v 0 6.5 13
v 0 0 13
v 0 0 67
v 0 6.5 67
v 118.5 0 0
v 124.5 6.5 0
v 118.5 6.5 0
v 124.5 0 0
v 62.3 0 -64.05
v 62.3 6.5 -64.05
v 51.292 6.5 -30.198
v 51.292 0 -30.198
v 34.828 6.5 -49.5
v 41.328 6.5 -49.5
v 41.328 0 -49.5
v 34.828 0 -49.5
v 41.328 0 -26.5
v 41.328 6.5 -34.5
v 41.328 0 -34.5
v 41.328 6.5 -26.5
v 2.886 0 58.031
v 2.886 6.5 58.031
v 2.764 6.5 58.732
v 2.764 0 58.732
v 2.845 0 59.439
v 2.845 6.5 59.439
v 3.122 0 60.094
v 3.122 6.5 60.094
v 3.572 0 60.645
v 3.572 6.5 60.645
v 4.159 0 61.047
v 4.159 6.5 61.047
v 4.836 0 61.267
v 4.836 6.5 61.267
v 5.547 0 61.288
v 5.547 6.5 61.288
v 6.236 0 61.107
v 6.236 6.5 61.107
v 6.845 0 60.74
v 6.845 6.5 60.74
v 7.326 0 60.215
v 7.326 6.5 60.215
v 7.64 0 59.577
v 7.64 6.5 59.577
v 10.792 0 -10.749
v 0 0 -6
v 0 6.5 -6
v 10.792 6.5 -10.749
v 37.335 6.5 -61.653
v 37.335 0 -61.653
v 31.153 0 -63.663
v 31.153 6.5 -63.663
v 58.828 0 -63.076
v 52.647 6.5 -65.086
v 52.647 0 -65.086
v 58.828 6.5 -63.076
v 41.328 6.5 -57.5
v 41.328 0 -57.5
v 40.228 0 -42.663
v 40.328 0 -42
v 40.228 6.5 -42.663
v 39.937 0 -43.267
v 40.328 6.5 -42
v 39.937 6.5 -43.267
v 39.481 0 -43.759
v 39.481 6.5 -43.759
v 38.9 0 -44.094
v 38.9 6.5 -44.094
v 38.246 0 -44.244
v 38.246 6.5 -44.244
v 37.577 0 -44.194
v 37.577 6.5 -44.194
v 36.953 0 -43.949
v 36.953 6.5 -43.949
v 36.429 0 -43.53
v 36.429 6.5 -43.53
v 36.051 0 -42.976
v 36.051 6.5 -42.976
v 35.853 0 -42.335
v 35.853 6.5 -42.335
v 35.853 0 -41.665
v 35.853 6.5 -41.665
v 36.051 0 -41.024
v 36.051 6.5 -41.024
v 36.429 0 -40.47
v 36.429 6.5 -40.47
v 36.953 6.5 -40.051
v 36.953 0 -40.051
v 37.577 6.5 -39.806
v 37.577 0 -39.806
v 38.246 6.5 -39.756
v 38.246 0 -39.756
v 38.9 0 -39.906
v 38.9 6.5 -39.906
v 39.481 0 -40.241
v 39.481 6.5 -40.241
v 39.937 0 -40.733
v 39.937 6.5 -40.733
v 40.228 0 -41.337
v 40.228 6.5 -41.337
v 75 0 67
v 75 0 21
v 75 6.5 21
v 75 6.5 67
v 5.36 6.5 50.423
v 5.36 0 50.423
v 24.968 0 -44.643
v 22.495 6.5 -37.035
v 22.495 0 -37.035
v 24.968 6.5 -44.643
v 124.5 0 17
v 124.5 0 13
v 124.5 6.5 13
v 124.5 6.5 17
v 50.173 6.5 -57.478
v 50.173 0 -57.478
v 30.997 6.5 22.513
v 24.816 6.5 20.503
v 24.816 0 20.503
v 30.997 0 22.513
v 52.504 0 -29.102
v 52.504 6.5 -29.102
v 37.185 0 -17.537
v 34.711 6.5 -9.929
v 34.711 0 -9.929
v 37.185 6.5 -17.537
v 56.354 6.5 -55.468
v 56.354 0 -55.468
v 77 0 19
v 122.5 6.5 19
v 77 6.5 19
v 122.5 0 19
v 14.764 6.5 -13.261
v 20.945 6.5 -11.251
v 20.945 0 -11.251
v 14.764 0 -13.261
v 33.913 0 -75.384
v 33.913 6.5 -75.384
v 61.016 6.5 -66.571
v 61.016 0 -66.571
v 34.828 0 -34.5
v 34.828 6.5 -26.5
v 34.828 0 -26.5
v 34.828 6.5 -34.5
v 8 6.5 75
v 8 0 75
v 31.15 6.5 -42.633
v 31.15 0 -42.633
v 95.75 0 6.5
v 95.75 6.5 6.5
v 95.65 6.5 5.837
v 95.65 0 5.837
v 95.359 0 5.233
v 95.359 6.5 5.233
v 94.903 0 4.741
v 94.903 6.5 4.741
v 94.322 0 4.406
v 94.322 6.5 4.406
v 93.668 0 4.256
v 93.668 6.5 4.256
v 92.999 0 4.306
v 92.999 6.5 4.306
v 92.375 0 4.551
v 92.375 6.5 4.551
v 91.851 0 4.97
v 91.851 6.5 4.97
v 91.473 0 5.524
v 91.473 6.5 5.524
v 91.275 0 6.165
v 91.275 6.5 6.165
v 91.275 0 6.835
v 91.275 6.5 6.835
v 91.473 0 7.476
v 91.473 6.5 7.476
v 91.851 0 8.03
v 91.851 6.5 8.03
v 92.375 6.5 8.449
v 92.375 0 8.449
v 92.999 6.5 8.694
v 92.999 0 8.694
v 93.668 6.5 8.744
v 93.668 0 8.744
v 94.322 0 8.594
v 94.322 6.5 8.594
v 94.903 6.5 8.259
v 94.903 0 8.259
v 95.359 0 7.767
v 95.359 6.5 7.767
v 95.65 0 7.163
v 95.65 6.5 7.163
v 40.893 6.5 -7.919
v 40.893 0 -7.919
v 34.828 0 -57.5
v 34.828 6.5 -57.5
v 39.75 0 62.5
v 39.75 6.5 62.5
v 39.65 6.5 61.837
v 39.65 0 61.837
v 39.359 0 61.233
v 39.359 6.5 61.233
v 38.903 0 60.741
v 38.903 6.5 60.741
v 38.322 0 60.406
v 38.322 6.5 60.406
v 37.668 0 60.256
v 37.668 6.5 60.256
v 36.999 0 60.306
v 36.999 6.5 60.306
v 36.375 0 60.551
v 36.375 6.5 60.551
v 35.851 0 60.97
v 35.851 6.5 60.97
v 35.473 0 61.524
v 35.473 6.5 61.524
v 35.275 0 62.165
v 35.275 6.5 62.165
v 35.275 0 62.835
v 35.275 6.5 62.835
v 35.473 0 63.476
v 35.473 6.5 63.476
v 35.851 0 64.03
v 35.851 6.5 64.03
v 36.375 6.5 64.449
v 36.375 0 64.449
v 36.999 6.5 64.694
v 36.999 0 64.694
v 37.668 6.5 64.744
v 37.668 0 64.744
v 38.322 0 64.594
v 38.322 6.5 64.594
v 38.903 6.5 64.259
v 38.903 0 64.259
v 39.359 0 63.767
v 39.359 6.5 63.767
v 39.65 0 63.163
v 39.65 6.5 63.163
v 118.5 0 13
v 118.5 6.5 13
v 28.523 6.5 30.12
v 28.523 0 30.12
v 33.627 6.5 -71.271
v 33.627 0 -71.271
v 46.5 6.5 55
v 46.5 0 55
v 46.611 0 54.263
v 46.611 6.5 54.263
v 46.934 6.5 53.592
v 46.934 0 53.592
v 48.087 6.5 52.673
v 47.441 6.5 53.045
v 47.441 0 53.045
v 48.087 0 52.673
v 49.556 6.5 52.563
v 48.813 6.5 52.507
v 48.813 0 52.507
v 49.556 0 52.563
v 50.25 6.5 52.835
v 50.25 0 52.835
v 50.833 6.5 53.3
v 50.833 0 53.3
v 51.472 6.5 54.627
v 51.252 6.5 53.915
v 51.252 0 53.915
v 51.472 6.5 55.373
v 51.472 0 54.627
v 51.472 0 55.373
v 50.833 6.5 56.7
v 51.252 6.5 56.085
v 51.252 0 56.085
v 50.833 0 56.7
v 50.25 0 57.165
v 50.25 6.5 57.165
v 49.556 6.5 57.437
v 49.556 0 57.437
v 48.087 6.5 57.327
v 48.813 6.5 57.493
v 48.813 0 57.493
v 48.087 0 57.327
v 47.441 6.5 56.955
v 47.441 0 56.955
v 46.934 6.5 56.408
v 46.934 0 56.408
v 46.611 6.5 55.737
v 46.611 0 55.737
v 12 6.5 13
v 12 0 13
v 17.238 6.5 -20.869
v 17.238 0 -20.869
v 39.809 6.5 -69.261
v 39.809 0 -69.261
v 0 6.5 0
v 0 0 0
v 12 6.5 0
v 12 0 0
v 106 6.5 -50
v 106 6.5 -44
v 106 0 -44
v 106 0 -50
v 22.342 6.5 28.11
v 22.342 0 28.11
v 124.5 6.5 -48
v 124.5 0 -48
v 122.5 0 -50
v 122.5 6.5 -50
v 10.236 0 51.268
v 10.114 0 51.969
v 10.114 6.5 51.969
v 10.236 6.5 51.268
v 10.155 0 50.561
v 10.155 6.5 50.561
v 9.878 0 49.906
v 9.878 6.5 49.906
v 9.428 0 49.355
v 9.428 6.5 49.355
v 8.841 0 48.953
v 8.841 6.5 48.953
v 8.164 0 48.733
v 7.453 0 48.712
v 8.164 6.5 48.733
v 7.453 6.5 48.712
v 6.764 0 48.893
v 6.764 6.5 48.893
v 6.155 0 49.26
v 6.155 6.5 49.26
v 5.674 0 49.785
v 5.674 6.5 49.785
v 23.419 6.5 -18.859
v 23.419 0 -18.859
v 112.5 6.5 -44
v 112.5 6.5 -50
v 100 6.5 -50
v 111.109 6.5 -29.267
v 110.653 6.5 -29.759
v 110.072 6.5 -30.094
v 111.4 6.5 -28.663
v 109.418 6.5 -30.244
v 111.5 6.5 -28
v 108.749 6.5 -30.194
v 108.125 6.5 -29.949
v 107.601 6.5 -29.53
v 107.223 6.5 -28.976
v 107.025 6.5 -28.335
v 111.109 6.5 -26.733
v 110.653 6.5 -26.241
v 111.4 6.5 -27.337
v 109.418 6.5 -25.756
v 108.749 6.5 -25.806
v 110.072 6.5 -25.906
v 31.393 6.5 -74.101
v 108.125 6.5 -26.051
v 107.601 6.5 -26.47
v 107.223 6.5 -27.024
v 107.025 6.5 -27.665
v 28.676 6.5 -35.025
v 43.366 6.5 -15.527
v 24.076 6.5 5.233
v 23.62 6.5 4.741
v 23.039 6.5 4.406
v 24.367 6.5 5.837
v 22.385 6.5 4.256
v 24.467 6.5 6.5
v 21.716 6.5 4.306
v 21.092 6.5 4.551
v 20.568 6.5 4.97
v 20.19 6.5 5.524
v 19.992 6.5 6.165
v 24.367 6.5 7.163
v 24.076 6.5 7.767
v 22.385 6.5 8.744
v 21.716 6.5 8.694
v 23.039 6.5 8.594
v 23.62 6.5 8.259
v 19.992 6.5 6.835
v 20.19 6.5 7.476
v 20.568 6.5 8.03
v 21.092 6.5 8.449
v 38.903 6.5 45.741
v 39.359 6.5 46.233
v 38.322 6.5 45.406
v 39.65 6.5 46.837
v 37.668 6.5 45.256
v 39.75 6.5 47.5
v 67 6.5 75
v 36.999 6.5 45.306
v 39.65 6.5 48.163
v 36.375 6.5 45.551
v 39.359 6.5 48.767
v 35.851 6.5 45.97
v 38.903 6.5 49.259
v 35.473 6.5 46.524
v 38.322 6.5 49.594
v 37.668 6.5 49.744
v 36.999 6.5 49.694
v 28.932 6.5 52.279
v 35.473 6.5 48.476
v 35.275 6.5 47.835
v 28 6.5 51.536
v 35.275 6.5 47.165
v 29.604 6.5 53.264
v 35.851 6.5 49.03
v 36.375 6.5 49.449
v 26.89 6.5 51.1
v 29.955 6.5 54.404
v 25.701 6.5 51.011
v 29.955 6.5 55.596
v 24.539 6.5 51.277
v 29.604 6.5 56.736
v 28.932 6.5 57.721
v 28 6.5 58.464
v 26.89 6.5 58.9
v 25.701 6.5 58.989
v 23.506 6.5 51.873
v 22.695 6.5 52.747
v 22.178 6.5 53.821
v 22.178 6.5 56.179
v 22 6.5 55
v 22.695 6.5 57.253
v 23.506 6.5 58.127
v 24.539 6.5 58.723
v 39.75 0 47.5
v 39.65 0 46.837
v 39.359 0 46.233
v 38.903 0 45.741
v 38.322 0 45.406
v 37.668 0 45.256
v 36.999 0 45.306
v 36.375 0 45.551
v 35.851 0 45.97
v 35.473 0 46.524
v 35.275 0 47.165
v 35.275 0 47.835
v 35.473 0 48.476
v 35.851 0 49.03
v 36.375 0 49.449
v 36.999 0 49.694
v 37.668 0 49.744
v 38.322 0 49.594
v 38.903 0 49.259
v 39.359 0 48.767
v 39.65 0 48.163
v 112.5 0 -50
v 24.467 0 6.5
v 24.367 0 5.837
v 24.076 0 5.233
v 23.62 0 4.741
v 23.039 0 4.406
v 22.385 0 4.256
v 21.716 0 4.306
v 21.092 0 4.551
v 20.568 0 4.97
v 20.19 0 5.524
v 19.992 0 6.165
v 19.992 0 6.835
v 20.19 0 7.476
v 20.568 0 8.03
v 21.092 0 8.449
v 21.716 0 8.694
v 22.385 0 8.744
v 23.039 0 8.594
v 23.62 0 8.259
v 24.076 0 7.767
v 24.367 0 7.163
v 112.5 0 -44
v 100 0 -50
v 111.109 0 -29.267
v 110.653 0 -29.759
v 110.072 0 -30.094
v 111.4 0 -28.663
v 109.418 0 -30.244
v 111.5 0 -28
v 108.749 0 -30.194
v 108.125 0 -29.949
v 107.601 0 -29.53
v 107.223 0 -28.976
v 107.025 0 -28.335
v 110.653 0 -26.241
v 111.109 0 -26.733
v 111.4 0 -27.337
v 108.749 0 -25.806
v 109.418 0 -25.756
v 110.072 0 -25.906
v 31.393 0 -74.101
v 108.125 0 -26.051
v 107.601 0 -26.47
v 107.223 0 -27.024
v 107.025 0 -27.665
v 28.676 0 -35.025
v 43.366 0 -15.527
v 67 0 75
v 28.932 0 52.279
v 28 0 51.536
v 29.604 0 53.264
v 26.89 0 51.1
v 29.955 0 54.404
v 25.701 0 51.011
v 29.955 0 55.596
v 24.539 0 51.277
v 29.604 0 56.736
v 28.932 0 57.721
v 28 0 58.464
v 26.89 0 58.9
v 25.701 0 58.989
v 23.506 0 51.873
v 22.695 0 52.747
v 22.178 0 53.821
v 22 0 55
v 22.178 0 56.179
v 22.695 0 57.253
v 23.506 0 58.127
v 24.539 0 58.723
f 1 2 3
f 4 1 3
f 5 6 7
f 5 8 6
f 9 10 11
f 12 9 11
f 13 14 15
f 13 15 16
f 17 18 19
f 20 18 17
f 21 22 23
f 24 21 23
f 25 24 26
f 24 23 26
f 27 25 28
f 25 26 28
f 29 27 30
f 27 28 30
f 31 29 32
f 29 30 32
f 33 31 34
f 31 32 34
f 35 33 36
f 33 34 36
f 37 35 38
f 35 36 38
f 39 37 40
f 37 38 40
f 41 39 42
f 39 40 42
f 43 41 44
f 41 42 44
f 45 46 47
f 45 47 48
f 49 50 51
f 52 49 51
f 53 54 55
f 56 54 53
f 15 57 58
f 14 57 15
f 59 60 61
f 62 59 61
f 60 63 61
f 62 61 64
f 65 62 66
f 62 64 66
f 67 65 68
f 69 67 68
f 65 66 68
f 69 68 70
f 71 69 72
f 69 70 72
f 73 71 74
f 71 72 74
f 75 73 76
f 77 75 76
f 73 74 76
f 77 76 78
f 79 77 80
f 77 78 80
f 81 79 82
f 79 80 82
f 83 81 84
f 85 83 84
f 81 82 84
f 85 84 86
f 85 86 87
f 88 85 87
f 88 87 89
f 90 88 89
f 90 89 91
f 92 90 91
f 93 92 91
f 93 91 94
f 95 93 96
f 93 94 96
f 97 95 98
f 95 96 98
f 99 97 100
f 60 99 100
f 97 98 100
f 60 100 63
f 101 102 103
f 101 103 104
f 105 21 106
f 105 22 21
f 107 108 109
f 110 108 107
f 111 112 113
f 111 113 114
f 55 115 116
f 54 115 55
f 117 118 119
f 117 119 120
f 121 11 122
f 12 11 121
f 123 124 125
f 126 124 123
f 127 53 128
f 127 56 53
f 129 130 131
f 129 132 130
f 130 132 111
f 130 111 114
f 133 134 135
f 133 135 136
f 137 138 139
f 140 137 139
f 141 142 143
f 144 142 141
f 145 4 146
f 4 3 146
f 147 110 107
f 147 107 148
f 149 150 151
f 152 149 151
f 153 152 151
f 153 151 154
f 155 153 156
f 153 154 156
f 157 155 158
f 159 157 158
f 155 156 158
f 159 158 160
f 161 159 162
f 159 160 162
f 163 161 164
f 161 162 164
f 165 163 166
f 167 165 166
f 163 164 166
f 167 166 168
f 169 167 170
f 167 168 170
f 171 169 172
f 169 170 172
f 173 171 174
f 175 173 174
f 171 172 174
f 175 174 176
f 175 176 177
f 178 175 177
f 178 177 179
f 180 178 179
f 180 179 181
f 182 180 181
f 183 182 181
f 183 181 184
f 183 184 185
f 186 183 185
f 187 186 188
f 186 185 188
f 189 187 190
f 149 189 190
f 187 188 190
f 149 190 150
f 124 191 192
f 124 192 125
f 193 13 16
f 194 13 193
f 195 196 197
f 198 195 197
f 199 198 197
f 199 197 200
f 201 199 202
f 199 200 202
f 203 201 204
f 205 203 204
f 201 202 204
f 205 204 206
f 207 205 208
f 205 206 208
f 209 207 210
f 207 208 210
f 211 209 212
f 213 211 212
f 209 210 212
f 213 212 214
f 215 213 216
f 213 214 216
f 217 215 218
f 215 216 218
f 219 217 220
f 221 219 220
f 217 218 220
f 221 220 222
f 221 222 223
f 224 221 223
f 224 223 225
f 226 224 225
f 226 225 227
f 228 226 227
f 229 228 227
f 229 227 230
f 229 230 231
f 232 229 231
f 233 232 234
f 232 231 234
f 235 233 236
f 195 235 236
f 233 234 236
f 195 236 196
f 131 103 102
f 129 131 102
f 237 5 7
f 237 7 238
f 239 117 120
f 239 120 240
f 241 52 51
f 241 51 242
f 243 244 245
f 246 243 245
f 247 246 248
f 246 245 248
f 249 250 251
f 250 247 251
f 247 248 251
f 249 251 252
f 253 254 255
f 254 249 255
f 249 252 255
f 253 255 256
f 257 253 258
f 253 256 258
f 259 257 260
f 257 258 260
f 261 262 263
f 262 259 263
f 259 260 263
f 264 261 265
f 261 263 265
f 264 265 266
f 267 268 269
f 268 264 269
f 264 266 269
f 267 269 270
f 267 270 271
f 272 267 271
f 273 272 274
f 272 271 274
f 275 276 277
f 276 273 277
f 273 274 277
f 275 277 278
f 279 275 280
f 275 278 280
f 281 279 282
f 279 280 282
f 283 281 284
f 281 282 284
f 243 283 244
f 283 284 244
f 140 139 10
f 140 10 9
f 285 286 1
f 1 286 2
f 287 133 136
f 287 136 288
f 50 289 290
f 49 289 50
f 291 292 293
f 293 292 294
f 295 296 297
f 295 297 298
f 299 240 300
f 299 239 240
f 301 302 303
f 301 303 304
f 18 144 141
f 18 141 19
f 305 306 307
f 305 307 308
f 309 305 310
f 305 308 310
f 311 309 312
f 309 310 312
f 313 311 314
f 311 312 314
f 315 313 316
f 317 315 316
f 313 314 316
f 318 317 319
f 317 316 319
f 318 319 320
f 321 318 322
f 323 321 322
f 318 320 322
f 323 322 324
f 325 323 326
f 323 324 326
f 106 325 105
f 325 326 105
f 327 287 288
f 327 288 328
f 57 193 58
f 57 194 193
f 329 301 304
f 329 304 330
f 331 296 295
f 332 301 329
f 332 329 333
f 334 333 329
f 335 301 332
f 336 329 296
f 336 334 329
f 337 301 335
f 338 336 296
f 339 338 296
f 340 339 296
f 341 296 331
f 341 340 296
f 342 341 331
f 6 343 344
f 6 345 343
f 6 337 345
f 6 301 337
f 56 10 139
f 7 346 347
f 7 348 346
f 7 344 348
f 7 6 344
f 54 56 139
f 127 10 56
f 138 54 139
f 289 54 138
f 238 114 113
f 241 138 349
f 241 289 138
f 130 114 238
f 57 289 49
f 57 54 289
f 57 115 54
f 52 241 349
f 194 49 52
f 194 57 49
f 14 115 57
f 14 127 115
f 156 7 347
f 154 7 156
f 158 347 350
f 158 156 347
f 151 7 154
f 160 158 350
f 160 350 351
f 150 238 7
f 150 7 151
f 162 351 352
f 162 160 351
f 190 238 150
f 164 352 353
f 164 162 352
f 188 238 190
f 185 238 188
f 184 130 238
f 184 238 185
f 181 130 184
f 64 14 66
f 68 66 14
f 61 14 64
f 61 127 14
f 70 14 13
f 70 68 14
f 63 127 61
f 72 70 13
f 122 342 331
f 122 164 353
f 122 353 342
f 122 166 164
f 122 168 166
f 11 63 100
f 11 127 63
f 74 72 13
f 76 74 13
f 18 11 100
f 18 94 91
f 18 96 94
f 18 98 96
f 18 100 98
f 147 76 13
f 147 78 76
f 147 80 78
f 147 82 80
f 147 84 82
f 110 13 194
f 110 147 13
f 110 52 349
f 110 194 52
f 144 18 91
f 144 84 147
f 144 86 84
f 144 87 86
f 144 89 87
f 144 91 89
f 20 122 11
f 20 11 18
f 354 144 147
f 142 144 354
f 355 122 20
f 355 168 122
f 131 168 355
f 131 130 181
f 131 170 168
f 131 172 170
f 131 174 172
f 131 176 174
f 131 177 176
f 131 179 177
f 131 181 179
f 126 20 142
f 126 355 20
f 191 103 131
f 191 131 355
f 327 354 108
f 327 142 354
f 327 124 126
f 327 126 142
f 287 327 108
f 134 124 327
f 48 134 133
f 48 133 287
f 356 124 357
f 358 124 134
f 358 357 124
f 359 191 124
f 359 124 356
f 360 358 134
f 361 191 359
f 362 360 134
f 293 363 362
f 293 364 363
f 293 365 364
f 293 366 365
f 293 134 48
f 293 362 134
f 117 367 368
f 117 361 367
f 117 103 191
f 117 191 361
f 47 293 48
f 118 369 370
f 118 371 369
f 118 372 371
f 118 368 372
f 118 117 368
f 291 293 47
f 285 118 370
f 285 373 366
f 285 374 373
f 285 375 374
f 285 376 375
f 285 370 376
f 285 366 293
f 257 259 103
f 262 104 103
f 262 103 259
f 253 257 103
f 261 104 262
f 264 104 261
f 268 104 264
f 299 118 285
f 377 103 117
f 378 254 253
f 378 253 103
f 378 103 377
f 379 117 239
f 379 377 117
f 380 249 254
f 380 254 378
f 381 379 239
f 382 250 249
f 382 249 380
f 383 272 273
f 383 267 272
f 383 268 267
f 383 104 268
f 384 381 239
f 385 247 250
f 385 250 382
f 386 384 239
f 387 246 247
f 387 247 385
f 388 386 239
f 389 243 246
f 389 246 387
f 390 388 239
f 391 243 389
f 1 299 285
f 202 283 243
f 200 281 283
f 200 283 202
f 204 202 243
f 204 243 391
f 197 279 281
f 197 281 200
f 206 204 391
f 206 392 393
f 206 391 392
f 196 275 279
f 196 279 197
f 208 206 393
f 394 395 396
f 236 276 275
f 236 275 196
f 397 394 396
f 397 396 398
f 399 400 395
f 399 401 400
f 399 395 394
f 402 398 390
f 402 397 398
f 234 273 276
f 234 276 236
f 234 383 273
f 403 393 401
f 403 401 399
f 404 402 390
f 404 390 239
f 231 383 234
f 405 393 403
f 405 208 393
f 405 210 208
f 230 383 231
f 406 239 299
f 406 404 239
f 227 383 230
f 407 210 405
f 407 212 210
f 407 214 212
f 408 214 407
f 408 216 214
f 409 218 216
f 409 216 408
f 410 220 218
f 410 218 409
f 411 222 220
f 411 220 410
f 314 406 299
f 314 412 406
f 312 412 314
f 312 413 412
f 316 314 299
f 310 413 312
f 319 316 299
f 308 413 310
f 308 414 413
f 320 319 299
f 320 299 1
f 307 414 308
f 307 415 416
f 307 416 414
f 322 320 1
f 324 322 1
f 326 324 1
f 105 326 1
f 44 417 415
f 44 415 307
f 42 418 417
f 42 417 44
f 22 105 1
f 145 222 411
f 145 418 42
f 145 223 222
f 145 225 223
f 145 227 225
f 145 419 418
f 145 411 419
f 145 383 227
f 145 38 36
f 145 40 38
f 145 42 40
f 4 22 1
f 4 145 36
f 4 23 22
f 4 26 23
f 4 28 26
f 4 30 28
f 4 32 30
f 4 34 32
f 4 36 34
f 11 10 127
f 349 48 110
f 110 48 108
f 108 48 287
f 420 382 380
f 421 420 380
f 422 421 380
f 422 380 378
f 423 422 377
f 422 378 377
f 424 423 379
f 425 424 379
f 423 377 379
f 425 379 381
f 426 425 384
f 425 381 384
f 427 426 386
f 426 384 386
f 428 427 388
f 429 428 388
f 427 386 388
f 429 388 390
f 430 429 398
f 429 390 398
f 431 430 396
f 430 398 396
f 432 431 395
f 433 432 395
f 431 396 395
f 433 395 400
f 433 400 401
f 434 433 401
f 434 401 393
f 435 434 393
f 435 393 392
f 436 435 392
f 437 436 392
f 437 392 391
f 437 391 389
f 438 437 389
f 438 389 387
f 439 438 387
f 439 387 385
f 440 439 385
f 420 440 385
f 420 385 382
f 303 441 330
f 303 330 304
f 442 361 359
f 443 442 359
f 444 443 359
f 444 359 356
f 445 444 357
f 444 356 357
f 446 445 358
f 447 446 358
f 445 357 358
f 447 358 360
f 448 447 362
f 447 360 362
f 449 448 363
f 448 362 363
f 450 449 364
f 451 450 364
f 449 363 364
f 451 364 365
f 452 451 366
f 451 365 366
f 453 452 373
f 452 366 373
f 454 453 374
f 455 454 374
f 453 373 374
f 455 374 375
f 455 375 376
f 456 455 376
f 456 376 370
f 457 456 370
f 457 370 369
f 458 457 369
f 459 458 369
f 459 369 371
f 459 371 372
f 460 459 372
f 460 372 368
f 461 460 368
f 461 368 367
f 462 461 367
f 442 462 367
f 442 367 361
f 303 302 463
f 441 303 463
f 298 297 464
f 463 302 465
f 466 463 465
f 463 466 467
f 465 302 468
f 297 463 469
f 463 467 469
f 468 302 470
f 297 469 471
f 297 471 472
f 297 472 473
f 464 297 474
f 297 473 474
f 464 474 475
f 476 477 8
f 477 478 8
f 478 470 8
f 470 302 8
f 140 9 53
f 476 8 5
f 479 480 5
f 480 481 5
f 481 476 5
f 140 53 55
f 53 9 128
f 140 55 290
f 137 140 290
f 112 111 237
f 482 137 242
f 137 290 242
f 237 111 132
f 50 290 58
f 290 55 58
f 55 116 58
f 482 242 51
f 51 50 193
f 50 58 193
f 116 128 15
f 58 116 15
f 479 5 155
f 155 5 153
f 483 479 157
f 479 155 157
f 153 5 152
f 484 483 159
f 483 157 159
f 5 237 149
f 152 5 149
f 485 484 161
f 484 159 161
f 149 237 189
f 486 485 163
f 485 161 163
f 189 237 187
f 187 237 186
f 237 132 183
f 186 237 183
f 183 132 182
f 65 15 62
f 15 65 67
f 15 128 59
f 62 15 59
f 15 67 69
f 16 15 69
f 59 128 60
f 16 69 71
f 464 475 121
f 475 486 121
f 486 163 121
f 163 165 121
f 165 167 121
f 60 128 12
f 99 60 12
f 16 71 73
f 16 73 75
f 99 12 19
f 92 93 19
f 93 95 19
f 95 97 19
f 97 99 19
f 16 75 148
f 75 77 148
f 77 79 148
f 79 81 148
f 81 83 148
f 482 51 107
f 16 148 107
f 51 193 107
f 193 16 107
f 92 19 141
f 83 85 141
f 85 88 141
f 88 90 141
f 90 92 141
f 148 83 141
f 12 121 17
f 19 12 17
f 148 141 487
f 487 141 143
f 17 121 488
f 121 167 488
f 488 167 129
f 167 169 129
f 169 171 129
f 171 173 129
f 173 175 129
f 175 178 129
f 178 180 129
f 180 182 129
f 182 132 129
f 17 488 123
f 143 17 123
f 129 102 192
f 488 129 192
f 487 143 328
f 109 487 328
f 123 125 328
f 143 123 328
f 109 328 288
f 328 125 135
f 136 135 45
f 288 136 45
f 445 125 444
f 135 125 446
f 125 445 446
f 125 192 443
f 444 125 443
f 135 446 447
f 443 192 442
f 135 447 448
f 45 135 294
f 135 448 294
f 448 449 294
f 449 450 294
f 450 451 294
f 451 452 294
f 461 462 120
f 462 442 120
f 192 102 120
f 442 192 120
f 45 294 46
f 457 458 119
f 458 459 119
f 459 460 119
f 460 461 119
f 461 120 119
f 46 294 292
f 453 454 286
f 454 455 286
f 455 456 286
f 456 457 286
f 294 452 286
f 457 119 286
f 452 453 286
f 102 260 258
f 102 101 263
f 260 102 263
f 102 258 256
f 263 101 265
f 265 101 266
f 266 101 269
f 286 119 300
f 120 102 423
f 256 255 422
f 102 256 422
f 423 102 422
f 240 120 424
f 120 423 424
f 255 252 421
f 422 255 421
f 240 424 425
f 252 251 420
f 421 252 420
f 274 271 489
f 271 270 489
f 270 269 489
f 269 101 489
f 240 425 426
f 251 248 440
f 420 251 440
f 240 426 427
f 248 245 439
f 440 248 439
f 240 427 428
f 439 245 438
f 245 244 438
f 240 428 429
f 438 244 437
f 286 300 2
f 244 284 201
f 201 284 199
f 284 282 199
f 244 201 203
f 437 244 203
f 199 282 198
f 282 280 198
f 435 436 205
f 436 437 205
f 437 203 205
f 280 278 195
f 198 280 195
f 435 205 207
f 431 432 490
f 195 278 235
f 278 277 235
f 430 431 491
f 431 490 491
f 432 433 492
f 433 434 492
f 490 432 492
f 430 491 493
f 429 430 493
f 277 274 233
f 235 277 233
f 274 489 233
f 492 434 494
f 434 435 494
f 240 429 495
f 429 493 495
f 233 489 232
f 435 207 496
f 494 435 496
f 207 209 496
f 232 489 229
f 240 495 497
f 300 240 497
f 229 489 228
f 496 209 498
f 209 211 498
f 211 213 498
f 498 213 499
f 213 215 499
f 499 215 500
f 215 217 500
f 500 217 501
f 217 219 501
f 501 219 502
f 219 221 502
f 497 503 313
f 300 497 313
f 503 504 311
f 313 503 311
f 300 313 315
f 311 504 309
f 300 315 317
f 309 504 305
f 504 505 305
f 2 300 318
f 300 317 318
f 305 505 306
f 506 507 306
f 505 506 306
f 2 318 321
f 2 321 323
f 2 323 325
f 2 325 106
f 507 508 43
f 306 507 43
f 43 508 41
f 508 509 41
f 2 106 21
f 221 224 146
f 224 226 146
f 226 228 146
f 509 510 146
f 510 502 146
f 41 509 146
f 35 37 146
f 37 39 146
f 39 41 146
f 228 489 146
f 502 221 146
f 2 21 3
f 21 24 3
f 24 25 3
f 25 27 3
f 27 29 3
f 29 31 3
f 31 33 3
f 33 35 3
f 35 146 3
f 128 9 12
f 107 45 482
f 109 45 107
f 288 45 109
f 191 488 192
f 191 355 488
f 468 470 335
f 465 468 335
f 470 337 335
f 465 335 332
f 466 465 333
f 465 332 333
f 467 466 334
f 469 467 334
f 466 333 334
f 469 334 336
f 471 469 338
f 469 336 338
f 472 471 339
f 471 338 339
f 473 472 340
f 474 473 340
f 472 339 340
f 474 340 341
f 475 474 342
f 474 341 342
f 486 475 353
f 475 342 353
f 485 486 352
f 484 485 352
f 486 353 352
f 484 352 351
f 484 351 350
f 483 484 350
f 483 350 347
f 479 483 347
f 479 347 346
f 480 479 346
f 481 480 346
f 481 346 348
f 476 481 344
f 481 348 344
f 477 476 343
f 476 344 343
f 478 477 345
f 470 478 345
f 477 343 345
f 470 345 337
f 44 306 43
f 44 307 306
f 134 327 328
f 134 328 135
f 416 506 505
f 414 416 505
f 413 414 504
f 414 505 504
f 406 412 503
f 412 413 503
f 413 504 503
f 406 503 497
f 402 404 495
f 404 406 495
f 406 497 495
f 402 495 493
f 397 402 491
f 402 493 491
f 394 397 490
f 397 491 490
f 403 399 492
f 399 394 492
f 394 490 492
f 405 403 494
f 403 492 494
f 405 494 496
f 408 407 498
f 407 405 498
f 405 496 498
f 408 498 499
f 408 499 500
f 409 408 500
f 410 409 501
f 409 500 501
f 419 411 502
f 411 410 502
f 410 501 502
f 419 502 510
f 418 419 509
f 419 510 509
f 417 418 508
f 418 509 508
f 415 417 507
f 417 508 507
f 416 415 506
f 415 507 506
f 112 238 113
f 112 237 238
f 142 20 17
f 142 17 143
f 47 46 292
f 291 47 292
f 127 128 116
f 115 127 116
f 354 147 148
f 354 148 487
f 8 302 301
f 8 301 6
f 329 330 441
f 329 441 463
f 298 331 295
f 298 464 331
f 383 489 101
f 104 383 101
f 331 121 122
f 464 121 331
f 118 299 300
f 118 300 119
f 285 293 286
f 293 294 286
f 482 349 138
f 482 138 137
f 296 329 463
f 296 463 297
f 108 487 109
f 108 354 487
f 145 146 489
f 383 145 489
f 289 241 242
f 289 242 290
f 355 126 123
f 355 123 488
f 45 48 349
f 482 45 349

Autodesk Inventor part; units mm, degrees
ref_plane "YZ Plane" through (0, 0, 0) normal (1, 0, 0) x (0, 1, 0)
ref_plane "XZ Plane" through (0, 0, 0) normal (0, 1, 0) x (-1, 0, 0)
ref_plane "XY Plane" through (0, 0, 0) normal (0, 0, 1) x (1, 0, 0)
sketch "Sketch1" plane through (0, 0, 0) normal (0, 1, 0) x (-1, 0, 0)
  line L0 (0, -6) -> (0, 0)
  line L1 (0, 0) -> (-12, 0)
  line L2 (-12, 0) -> (-12, 13)
  line L3 (-12, 13) -> (0, 13)
  line L4 (0, 13) -> (0, 67)
  line L5 (0, 67) -> (-8, 75)
  line L6 (-8, 75) -> (-67, 75)
  line L7 (-67, 75) -> (-75, 67)
  line L8 (0, -6) -> (-100, -50)
  line L9 (-100, -50) -> (-124.5, -50)
  line L10 (-124.5, -50) -> (-124.5, 0)
  line L11 (-124.5, 0) -> (-118.5, 0)
  line L12 (-118.5, 0) -> (-118.5, 13)
  line L13 (-118.5, 13) -> (-124.5, 13)
  line L14 (-124.5, 13) -> (-124.5, 19)
  line L15 (-124.5, 19) -> (-75, 19)
  line L16 (-75, 19) -> (-75, 67)
  circle A0 centre (-26, 55) radius 4
  circle A1 centre (-49, 55) radius 2.5
  line L17 (-106, -50) -> (-112.5, -50) construction
  line L18 (-112.5, -50) -> (-112.5, 13) construction
  line L19 (-112.5, 13) -> (-106, 13) construction
  line L20 (-106, 13) -> (-106, -50) construction
  dimension "d0" = 13
  dimension "d1" = 12
  dimension "d2" = 6
  dimension "d3" = 6
  dimension "d4" = 6
  dimension "d6" = 75
  dimension "d7" = 8
  dimension "d8" = 5
  dimension "d9" = 23
  dimension "d10" = 106.5
  dimension "d11" = 45
  dimension "d12" = 8
  dimension "d13" = 6.5
  dimension "d14" = 6
  dimension "d15" = 6
  dimension "d16" = 42
  dimension "d17" = 20
  dimension "d18" = 50
  dimension "d19" = 26
extrude "Extrusion1" add sketch "Sketch1" along normal blind 6.5
sketch "Sketch3" plane through (0, 6.5, 0) normal (0, 1, 0) x (1, 0, 0)
  line L0 (124.5, 0) -> (124.5, 50) projected
  line L1 (124.5, 50) -> (100, 50) projected
  line L2 (106, 50) -> (112.5, 50)
  line L3 (112.5, 50) -> (112.5, 44)
  line L4 (112.5, 44) -> (106, 44)
  line L5 (106, 44) -> (106, 50)
  dimension "d27" = 6
  dimension "d28" = 6.5
  dimension "d29" = 12
extrude "Extrusion3" cut sketch "Sketch3" against normal through all
chamfer "Chamfer1" distance 2 angle 45 3 edges at (75, 3.25, 19) (124.5, 3.25, 19) (124.5, 3.25, -50)
sketch "Sketch4" plane through (0, 6.5, 0) normal (0, 1, 0) x (1, 0, 0)
  line L0 (124.5, 0) -> (124.5, 48) projected
  circle A0 centre (26, -55) radius 4 projected
  circle A1 centre (49, -55) radius 2.5 projected
  circle A2 centre (37.5, -47.5) radius 2.25
  circle A3 centre (37.5, -62.5) radius 2.25
  line L1 (37.5, -47.5) -> (37.5, -62.5) construction
  line L2 (26, -55) -> (49, -55) construction
  point P0 (37.5, -55)
  dimension "d35" = 15
  dimension "d36" = 4.5
extrude "Extrusion4" cut sketch "Sketch4" against normal through all contours A2 | A3
sketch "Sketch5" plane through (0, 6.5, 0) normal (0, 1, 0) x (1, 0, 0)
  line L0 (106, 44) -> (106, 50) projected
  line L1 (100, 50) -> (0, 6) projected
  line L2 (0, 6) -> (0, 0) projected
  line L3 (0, 0) -> (12, 0) projected
  line L4 (12, -13) -> (0, -13) projected
  line L5 (0, -13) -> (0, -67) projected
  line L6 (53, 88) -> (6.5, -55) construction
  line L7 (10.7922, 10.7486) -> (32.0112, 76.0025)
  line L8 (32.0112, 76.0025) -> (62.9182, 65.9523)
  line L9 (62.9182, 65.9523) -> (50.6734, 28.2963)
  line L10 (50.6734, 28.2963) -> (10.7922, 10.7486)
  circle A0 centre (6.5, -55) radius 0.9 construction
  circle A1 centre (53, 88) radius 0.9 construction
  point P0 (47.4647, 70.9774)
  dimension "d39" = 42
  dimension "d40" = 6.5
  dimension "d41" = 106
  dimension "d42" = 53
  dimension "d43" = 88
  dimension "d44" = 32.5
  dimension "d45" = 1.8
  dimension "d46" = 17.9
extrude "Extrusion5" add sketch "Sketch5" against normal blind 6.5
sketch "Sketch6" plane through (0, 6.5, 0) normal (0, 1, 0) x (1, 0, 0)
  line L0 (50.6734, 28.2963) -> (62.9182, 65.9523) projected
  line L1 (62.9182, 65.9523) -> (32.0112, 76.0025) projected
  line L2 (32.0112, 76.0025) -> (10.7922, 10.7486) projected
  line L3 (33.6272, 71.2708) -> (39.8086, 69.2608)
  line L4 (39.8086, 69.2608) -> (37.3347, 61.6529)
  line L5 (37.3347, 61.6529) -> (31.1533, 63.6629)
  line L6 (31.1533, 63.6629) -> (33.6272, 71.2708)
  line L7 (52.6469, 65.0861) -> (58.8283, 63.076)
  line L8 (58.8283, 63.076) -> (56.3544, 55.4682)
  line L9 (56.3544, 55.4682) -> (50.173, 57.4782)
  line L10 (50.173, 57.4782) -> (52.6469, 65.0861)
  line L11 (17.2376, 20.8686) -> (23.419, 18.8586)
  line L12 (23.419, 18.8586) -> (20.9451, 11.2507)
  line L13 (20.9451, 11.2507) -> (14.7637, 13.2607)
  line L14 (14.7637, 13.2607) -> (17.2376, 20.8686)
  line L15 (24.8156, -20.5026) -> (30.997, -22.5126)
  line L16 (30.997, -22.5126) -> (28.5231, -30.1205)
  line L17 (28.5231, -30.1205) -> (22.3417, -28.1105)
  line L18 (22.3417, -28.1105) -> (24.8156, -20.5026)
  line L19 (24.9685, 44.6432) -> (31.15, 42.6332)
  line L20 (31.15, 42.6332) -> (28.6761, 35.0253)
  line L21 (28.6761, 35.0253) -> (22.4947, 37.0353)
  line L22 (22.4947, 37.0353) -> (24.9685, 44.6432)
  line L23 (37.185, 17.5368) -> (43.3665, 15.5268)
  line L24 (43.3665, 15.5268) -> (40.8926, 7.9189)
  line L25 (40.8926, 7.9189) -> (34.7112, 9.9289)
  line L26 (34.7112, 9.9289) -> (37.185, 17.5368)
  dimension "d49" = 6.5
  dimension "d50" = 3
  dimension "d52" = 3
  dimension "d53" = 4
  dimension "d54" = 8
  dimension "d57" = 45
  dimension "d58" = 20
  dimension "d59" = 82
  dimension "d60" = 42
extrude "Extrusion6" cut sketch "Sketch6" against normal through all
sketch "Sketch7" plane through (0, 6.5, 0) normal (0, 1, 0) x (1, 0, 0)
  line L0 (32.0112, 76.0025) -> (10.7922, 10.7486) projected
  line L1 (12, -13) -> (0, -13) projected
  line L2 (0, -13) -> (0, -67) projected
  line L3 (5.2631, -58.8039) -> (7.7369, -51.1961) construction
  line L4 (2.8856, -58.0308) -> (5.3595, -50.423)
  line L5 (10.1144, -51.9692) -> (7.6405, -59.577)
  arc A0 (2.8856, -58.0308) -> (7.6405, -59.577) centre (5.2631, -58.8039) ccw
  arc A1 (10.1144, -51.9692) -> (5.3595, -50.423) centre (7.7369, -51.1961) ccw
  point P0 (6.5, -55)
  point P1 (6.5, -55)
  dimension "d63" = 42
  dimension "d64" = 6.5
  dimension "d65" = 5
  dimension "d66" = 8
extrude "Extrusion7" cut sketch "Sketch7" against normal through all
chamfer "Chamfer2" distance 2 angle 45 3 edges at (32.0112, 3.25, -76.0025) (62.9182, 3.25, -65.9523) (50.6734, 3.25, -28.2963)
sketch "Sketch8" plane through (0, 6.5, 0) normal (0, 1, 0) x (1, 0, 0)
  line L0 (12, 0) -> (12, -13) projected
  line L1 (0, -13) -> (0, -67) projected
  circle A0 centre (22.217, -6.5) radius 2.25
  point P0 (12, -6.5)
  dimension "d72" = 4.5
  dimension "d73" = 22.217
extrude "Extrusion8" cut sketch "Sketch8" against normal through all
sketch "Sketch9" plane through (0, 6.5, 0) normal (0, 1, 0) x (1, 0, 0)
  line L0 (0, 6) -> (0, 0) projected
  line L1 (0, 0) -> (12, 0) projected
  line L2 (34.828, 57.5) -> (41.328, 57.5)
  line L3 (41.328, 57.5) -> (41.328, 49.5)
  line L4 (41.328, 49.5) -> (34.828, 49.5)
  line L5 (34.828, 49.5) -> (34.828, 57.5)
  line L6 (34.828, 34.5) -> (41.328, 34.5)
  line L7 (41.328, 34.5) -> (41.328, 26.5)
  line L8 (41.328, 26.5) -> (34.828, 26.5)
  line L9 (34.828, 26.5) -> (34.828, 34.5)
  circle A0 centre (38.078, 42) radius 2.25
  point P0 (38.078, 49.5)
  dimension "d76" = 8
  dimension "d77" = 6.5
  dimension "d78" = 15
  dimension "d79" = 4.5
  dimension "d80" = 7.5
  dimension "d81" = 38.078
  dimension "d82" = 42
extrude "Extrusion9" cut sketch "Sketch9" against normal through all
sketch "Sketch10" plane through (0, 6.5, 0) normal (0, 1, 0) x (1, 0, 0)
  circle A0 centre (22.217, -6.5) radius 2.25 projected
  line L0 (118.5, -13) -> (118.5, 0) projected
  line L1 (118.5, 0) -> (124.5, 0) projected
  line L2 (112.5, 44) -> (106, 44) projected
  circle A1 centre (93.5, -6.5) radius 2.25
  circle A2 centre (109.25, 28) radius 2.25
  point P0 (109.25, 44)
  dimension "d85" = 25
  dimension "d86" = 28
extrude "Extrusion10" cut sketch "Sketch10" against normal through all contours A1 | A2
equation "\"d2\" = d3"
equation "\"d4\" = d3"
equation "\"d42\" = 0.5 * d41"
equation "\"d80\" = 0.5 * d78"
properties part number "z_axis_top" material "Plywood, Finish"
